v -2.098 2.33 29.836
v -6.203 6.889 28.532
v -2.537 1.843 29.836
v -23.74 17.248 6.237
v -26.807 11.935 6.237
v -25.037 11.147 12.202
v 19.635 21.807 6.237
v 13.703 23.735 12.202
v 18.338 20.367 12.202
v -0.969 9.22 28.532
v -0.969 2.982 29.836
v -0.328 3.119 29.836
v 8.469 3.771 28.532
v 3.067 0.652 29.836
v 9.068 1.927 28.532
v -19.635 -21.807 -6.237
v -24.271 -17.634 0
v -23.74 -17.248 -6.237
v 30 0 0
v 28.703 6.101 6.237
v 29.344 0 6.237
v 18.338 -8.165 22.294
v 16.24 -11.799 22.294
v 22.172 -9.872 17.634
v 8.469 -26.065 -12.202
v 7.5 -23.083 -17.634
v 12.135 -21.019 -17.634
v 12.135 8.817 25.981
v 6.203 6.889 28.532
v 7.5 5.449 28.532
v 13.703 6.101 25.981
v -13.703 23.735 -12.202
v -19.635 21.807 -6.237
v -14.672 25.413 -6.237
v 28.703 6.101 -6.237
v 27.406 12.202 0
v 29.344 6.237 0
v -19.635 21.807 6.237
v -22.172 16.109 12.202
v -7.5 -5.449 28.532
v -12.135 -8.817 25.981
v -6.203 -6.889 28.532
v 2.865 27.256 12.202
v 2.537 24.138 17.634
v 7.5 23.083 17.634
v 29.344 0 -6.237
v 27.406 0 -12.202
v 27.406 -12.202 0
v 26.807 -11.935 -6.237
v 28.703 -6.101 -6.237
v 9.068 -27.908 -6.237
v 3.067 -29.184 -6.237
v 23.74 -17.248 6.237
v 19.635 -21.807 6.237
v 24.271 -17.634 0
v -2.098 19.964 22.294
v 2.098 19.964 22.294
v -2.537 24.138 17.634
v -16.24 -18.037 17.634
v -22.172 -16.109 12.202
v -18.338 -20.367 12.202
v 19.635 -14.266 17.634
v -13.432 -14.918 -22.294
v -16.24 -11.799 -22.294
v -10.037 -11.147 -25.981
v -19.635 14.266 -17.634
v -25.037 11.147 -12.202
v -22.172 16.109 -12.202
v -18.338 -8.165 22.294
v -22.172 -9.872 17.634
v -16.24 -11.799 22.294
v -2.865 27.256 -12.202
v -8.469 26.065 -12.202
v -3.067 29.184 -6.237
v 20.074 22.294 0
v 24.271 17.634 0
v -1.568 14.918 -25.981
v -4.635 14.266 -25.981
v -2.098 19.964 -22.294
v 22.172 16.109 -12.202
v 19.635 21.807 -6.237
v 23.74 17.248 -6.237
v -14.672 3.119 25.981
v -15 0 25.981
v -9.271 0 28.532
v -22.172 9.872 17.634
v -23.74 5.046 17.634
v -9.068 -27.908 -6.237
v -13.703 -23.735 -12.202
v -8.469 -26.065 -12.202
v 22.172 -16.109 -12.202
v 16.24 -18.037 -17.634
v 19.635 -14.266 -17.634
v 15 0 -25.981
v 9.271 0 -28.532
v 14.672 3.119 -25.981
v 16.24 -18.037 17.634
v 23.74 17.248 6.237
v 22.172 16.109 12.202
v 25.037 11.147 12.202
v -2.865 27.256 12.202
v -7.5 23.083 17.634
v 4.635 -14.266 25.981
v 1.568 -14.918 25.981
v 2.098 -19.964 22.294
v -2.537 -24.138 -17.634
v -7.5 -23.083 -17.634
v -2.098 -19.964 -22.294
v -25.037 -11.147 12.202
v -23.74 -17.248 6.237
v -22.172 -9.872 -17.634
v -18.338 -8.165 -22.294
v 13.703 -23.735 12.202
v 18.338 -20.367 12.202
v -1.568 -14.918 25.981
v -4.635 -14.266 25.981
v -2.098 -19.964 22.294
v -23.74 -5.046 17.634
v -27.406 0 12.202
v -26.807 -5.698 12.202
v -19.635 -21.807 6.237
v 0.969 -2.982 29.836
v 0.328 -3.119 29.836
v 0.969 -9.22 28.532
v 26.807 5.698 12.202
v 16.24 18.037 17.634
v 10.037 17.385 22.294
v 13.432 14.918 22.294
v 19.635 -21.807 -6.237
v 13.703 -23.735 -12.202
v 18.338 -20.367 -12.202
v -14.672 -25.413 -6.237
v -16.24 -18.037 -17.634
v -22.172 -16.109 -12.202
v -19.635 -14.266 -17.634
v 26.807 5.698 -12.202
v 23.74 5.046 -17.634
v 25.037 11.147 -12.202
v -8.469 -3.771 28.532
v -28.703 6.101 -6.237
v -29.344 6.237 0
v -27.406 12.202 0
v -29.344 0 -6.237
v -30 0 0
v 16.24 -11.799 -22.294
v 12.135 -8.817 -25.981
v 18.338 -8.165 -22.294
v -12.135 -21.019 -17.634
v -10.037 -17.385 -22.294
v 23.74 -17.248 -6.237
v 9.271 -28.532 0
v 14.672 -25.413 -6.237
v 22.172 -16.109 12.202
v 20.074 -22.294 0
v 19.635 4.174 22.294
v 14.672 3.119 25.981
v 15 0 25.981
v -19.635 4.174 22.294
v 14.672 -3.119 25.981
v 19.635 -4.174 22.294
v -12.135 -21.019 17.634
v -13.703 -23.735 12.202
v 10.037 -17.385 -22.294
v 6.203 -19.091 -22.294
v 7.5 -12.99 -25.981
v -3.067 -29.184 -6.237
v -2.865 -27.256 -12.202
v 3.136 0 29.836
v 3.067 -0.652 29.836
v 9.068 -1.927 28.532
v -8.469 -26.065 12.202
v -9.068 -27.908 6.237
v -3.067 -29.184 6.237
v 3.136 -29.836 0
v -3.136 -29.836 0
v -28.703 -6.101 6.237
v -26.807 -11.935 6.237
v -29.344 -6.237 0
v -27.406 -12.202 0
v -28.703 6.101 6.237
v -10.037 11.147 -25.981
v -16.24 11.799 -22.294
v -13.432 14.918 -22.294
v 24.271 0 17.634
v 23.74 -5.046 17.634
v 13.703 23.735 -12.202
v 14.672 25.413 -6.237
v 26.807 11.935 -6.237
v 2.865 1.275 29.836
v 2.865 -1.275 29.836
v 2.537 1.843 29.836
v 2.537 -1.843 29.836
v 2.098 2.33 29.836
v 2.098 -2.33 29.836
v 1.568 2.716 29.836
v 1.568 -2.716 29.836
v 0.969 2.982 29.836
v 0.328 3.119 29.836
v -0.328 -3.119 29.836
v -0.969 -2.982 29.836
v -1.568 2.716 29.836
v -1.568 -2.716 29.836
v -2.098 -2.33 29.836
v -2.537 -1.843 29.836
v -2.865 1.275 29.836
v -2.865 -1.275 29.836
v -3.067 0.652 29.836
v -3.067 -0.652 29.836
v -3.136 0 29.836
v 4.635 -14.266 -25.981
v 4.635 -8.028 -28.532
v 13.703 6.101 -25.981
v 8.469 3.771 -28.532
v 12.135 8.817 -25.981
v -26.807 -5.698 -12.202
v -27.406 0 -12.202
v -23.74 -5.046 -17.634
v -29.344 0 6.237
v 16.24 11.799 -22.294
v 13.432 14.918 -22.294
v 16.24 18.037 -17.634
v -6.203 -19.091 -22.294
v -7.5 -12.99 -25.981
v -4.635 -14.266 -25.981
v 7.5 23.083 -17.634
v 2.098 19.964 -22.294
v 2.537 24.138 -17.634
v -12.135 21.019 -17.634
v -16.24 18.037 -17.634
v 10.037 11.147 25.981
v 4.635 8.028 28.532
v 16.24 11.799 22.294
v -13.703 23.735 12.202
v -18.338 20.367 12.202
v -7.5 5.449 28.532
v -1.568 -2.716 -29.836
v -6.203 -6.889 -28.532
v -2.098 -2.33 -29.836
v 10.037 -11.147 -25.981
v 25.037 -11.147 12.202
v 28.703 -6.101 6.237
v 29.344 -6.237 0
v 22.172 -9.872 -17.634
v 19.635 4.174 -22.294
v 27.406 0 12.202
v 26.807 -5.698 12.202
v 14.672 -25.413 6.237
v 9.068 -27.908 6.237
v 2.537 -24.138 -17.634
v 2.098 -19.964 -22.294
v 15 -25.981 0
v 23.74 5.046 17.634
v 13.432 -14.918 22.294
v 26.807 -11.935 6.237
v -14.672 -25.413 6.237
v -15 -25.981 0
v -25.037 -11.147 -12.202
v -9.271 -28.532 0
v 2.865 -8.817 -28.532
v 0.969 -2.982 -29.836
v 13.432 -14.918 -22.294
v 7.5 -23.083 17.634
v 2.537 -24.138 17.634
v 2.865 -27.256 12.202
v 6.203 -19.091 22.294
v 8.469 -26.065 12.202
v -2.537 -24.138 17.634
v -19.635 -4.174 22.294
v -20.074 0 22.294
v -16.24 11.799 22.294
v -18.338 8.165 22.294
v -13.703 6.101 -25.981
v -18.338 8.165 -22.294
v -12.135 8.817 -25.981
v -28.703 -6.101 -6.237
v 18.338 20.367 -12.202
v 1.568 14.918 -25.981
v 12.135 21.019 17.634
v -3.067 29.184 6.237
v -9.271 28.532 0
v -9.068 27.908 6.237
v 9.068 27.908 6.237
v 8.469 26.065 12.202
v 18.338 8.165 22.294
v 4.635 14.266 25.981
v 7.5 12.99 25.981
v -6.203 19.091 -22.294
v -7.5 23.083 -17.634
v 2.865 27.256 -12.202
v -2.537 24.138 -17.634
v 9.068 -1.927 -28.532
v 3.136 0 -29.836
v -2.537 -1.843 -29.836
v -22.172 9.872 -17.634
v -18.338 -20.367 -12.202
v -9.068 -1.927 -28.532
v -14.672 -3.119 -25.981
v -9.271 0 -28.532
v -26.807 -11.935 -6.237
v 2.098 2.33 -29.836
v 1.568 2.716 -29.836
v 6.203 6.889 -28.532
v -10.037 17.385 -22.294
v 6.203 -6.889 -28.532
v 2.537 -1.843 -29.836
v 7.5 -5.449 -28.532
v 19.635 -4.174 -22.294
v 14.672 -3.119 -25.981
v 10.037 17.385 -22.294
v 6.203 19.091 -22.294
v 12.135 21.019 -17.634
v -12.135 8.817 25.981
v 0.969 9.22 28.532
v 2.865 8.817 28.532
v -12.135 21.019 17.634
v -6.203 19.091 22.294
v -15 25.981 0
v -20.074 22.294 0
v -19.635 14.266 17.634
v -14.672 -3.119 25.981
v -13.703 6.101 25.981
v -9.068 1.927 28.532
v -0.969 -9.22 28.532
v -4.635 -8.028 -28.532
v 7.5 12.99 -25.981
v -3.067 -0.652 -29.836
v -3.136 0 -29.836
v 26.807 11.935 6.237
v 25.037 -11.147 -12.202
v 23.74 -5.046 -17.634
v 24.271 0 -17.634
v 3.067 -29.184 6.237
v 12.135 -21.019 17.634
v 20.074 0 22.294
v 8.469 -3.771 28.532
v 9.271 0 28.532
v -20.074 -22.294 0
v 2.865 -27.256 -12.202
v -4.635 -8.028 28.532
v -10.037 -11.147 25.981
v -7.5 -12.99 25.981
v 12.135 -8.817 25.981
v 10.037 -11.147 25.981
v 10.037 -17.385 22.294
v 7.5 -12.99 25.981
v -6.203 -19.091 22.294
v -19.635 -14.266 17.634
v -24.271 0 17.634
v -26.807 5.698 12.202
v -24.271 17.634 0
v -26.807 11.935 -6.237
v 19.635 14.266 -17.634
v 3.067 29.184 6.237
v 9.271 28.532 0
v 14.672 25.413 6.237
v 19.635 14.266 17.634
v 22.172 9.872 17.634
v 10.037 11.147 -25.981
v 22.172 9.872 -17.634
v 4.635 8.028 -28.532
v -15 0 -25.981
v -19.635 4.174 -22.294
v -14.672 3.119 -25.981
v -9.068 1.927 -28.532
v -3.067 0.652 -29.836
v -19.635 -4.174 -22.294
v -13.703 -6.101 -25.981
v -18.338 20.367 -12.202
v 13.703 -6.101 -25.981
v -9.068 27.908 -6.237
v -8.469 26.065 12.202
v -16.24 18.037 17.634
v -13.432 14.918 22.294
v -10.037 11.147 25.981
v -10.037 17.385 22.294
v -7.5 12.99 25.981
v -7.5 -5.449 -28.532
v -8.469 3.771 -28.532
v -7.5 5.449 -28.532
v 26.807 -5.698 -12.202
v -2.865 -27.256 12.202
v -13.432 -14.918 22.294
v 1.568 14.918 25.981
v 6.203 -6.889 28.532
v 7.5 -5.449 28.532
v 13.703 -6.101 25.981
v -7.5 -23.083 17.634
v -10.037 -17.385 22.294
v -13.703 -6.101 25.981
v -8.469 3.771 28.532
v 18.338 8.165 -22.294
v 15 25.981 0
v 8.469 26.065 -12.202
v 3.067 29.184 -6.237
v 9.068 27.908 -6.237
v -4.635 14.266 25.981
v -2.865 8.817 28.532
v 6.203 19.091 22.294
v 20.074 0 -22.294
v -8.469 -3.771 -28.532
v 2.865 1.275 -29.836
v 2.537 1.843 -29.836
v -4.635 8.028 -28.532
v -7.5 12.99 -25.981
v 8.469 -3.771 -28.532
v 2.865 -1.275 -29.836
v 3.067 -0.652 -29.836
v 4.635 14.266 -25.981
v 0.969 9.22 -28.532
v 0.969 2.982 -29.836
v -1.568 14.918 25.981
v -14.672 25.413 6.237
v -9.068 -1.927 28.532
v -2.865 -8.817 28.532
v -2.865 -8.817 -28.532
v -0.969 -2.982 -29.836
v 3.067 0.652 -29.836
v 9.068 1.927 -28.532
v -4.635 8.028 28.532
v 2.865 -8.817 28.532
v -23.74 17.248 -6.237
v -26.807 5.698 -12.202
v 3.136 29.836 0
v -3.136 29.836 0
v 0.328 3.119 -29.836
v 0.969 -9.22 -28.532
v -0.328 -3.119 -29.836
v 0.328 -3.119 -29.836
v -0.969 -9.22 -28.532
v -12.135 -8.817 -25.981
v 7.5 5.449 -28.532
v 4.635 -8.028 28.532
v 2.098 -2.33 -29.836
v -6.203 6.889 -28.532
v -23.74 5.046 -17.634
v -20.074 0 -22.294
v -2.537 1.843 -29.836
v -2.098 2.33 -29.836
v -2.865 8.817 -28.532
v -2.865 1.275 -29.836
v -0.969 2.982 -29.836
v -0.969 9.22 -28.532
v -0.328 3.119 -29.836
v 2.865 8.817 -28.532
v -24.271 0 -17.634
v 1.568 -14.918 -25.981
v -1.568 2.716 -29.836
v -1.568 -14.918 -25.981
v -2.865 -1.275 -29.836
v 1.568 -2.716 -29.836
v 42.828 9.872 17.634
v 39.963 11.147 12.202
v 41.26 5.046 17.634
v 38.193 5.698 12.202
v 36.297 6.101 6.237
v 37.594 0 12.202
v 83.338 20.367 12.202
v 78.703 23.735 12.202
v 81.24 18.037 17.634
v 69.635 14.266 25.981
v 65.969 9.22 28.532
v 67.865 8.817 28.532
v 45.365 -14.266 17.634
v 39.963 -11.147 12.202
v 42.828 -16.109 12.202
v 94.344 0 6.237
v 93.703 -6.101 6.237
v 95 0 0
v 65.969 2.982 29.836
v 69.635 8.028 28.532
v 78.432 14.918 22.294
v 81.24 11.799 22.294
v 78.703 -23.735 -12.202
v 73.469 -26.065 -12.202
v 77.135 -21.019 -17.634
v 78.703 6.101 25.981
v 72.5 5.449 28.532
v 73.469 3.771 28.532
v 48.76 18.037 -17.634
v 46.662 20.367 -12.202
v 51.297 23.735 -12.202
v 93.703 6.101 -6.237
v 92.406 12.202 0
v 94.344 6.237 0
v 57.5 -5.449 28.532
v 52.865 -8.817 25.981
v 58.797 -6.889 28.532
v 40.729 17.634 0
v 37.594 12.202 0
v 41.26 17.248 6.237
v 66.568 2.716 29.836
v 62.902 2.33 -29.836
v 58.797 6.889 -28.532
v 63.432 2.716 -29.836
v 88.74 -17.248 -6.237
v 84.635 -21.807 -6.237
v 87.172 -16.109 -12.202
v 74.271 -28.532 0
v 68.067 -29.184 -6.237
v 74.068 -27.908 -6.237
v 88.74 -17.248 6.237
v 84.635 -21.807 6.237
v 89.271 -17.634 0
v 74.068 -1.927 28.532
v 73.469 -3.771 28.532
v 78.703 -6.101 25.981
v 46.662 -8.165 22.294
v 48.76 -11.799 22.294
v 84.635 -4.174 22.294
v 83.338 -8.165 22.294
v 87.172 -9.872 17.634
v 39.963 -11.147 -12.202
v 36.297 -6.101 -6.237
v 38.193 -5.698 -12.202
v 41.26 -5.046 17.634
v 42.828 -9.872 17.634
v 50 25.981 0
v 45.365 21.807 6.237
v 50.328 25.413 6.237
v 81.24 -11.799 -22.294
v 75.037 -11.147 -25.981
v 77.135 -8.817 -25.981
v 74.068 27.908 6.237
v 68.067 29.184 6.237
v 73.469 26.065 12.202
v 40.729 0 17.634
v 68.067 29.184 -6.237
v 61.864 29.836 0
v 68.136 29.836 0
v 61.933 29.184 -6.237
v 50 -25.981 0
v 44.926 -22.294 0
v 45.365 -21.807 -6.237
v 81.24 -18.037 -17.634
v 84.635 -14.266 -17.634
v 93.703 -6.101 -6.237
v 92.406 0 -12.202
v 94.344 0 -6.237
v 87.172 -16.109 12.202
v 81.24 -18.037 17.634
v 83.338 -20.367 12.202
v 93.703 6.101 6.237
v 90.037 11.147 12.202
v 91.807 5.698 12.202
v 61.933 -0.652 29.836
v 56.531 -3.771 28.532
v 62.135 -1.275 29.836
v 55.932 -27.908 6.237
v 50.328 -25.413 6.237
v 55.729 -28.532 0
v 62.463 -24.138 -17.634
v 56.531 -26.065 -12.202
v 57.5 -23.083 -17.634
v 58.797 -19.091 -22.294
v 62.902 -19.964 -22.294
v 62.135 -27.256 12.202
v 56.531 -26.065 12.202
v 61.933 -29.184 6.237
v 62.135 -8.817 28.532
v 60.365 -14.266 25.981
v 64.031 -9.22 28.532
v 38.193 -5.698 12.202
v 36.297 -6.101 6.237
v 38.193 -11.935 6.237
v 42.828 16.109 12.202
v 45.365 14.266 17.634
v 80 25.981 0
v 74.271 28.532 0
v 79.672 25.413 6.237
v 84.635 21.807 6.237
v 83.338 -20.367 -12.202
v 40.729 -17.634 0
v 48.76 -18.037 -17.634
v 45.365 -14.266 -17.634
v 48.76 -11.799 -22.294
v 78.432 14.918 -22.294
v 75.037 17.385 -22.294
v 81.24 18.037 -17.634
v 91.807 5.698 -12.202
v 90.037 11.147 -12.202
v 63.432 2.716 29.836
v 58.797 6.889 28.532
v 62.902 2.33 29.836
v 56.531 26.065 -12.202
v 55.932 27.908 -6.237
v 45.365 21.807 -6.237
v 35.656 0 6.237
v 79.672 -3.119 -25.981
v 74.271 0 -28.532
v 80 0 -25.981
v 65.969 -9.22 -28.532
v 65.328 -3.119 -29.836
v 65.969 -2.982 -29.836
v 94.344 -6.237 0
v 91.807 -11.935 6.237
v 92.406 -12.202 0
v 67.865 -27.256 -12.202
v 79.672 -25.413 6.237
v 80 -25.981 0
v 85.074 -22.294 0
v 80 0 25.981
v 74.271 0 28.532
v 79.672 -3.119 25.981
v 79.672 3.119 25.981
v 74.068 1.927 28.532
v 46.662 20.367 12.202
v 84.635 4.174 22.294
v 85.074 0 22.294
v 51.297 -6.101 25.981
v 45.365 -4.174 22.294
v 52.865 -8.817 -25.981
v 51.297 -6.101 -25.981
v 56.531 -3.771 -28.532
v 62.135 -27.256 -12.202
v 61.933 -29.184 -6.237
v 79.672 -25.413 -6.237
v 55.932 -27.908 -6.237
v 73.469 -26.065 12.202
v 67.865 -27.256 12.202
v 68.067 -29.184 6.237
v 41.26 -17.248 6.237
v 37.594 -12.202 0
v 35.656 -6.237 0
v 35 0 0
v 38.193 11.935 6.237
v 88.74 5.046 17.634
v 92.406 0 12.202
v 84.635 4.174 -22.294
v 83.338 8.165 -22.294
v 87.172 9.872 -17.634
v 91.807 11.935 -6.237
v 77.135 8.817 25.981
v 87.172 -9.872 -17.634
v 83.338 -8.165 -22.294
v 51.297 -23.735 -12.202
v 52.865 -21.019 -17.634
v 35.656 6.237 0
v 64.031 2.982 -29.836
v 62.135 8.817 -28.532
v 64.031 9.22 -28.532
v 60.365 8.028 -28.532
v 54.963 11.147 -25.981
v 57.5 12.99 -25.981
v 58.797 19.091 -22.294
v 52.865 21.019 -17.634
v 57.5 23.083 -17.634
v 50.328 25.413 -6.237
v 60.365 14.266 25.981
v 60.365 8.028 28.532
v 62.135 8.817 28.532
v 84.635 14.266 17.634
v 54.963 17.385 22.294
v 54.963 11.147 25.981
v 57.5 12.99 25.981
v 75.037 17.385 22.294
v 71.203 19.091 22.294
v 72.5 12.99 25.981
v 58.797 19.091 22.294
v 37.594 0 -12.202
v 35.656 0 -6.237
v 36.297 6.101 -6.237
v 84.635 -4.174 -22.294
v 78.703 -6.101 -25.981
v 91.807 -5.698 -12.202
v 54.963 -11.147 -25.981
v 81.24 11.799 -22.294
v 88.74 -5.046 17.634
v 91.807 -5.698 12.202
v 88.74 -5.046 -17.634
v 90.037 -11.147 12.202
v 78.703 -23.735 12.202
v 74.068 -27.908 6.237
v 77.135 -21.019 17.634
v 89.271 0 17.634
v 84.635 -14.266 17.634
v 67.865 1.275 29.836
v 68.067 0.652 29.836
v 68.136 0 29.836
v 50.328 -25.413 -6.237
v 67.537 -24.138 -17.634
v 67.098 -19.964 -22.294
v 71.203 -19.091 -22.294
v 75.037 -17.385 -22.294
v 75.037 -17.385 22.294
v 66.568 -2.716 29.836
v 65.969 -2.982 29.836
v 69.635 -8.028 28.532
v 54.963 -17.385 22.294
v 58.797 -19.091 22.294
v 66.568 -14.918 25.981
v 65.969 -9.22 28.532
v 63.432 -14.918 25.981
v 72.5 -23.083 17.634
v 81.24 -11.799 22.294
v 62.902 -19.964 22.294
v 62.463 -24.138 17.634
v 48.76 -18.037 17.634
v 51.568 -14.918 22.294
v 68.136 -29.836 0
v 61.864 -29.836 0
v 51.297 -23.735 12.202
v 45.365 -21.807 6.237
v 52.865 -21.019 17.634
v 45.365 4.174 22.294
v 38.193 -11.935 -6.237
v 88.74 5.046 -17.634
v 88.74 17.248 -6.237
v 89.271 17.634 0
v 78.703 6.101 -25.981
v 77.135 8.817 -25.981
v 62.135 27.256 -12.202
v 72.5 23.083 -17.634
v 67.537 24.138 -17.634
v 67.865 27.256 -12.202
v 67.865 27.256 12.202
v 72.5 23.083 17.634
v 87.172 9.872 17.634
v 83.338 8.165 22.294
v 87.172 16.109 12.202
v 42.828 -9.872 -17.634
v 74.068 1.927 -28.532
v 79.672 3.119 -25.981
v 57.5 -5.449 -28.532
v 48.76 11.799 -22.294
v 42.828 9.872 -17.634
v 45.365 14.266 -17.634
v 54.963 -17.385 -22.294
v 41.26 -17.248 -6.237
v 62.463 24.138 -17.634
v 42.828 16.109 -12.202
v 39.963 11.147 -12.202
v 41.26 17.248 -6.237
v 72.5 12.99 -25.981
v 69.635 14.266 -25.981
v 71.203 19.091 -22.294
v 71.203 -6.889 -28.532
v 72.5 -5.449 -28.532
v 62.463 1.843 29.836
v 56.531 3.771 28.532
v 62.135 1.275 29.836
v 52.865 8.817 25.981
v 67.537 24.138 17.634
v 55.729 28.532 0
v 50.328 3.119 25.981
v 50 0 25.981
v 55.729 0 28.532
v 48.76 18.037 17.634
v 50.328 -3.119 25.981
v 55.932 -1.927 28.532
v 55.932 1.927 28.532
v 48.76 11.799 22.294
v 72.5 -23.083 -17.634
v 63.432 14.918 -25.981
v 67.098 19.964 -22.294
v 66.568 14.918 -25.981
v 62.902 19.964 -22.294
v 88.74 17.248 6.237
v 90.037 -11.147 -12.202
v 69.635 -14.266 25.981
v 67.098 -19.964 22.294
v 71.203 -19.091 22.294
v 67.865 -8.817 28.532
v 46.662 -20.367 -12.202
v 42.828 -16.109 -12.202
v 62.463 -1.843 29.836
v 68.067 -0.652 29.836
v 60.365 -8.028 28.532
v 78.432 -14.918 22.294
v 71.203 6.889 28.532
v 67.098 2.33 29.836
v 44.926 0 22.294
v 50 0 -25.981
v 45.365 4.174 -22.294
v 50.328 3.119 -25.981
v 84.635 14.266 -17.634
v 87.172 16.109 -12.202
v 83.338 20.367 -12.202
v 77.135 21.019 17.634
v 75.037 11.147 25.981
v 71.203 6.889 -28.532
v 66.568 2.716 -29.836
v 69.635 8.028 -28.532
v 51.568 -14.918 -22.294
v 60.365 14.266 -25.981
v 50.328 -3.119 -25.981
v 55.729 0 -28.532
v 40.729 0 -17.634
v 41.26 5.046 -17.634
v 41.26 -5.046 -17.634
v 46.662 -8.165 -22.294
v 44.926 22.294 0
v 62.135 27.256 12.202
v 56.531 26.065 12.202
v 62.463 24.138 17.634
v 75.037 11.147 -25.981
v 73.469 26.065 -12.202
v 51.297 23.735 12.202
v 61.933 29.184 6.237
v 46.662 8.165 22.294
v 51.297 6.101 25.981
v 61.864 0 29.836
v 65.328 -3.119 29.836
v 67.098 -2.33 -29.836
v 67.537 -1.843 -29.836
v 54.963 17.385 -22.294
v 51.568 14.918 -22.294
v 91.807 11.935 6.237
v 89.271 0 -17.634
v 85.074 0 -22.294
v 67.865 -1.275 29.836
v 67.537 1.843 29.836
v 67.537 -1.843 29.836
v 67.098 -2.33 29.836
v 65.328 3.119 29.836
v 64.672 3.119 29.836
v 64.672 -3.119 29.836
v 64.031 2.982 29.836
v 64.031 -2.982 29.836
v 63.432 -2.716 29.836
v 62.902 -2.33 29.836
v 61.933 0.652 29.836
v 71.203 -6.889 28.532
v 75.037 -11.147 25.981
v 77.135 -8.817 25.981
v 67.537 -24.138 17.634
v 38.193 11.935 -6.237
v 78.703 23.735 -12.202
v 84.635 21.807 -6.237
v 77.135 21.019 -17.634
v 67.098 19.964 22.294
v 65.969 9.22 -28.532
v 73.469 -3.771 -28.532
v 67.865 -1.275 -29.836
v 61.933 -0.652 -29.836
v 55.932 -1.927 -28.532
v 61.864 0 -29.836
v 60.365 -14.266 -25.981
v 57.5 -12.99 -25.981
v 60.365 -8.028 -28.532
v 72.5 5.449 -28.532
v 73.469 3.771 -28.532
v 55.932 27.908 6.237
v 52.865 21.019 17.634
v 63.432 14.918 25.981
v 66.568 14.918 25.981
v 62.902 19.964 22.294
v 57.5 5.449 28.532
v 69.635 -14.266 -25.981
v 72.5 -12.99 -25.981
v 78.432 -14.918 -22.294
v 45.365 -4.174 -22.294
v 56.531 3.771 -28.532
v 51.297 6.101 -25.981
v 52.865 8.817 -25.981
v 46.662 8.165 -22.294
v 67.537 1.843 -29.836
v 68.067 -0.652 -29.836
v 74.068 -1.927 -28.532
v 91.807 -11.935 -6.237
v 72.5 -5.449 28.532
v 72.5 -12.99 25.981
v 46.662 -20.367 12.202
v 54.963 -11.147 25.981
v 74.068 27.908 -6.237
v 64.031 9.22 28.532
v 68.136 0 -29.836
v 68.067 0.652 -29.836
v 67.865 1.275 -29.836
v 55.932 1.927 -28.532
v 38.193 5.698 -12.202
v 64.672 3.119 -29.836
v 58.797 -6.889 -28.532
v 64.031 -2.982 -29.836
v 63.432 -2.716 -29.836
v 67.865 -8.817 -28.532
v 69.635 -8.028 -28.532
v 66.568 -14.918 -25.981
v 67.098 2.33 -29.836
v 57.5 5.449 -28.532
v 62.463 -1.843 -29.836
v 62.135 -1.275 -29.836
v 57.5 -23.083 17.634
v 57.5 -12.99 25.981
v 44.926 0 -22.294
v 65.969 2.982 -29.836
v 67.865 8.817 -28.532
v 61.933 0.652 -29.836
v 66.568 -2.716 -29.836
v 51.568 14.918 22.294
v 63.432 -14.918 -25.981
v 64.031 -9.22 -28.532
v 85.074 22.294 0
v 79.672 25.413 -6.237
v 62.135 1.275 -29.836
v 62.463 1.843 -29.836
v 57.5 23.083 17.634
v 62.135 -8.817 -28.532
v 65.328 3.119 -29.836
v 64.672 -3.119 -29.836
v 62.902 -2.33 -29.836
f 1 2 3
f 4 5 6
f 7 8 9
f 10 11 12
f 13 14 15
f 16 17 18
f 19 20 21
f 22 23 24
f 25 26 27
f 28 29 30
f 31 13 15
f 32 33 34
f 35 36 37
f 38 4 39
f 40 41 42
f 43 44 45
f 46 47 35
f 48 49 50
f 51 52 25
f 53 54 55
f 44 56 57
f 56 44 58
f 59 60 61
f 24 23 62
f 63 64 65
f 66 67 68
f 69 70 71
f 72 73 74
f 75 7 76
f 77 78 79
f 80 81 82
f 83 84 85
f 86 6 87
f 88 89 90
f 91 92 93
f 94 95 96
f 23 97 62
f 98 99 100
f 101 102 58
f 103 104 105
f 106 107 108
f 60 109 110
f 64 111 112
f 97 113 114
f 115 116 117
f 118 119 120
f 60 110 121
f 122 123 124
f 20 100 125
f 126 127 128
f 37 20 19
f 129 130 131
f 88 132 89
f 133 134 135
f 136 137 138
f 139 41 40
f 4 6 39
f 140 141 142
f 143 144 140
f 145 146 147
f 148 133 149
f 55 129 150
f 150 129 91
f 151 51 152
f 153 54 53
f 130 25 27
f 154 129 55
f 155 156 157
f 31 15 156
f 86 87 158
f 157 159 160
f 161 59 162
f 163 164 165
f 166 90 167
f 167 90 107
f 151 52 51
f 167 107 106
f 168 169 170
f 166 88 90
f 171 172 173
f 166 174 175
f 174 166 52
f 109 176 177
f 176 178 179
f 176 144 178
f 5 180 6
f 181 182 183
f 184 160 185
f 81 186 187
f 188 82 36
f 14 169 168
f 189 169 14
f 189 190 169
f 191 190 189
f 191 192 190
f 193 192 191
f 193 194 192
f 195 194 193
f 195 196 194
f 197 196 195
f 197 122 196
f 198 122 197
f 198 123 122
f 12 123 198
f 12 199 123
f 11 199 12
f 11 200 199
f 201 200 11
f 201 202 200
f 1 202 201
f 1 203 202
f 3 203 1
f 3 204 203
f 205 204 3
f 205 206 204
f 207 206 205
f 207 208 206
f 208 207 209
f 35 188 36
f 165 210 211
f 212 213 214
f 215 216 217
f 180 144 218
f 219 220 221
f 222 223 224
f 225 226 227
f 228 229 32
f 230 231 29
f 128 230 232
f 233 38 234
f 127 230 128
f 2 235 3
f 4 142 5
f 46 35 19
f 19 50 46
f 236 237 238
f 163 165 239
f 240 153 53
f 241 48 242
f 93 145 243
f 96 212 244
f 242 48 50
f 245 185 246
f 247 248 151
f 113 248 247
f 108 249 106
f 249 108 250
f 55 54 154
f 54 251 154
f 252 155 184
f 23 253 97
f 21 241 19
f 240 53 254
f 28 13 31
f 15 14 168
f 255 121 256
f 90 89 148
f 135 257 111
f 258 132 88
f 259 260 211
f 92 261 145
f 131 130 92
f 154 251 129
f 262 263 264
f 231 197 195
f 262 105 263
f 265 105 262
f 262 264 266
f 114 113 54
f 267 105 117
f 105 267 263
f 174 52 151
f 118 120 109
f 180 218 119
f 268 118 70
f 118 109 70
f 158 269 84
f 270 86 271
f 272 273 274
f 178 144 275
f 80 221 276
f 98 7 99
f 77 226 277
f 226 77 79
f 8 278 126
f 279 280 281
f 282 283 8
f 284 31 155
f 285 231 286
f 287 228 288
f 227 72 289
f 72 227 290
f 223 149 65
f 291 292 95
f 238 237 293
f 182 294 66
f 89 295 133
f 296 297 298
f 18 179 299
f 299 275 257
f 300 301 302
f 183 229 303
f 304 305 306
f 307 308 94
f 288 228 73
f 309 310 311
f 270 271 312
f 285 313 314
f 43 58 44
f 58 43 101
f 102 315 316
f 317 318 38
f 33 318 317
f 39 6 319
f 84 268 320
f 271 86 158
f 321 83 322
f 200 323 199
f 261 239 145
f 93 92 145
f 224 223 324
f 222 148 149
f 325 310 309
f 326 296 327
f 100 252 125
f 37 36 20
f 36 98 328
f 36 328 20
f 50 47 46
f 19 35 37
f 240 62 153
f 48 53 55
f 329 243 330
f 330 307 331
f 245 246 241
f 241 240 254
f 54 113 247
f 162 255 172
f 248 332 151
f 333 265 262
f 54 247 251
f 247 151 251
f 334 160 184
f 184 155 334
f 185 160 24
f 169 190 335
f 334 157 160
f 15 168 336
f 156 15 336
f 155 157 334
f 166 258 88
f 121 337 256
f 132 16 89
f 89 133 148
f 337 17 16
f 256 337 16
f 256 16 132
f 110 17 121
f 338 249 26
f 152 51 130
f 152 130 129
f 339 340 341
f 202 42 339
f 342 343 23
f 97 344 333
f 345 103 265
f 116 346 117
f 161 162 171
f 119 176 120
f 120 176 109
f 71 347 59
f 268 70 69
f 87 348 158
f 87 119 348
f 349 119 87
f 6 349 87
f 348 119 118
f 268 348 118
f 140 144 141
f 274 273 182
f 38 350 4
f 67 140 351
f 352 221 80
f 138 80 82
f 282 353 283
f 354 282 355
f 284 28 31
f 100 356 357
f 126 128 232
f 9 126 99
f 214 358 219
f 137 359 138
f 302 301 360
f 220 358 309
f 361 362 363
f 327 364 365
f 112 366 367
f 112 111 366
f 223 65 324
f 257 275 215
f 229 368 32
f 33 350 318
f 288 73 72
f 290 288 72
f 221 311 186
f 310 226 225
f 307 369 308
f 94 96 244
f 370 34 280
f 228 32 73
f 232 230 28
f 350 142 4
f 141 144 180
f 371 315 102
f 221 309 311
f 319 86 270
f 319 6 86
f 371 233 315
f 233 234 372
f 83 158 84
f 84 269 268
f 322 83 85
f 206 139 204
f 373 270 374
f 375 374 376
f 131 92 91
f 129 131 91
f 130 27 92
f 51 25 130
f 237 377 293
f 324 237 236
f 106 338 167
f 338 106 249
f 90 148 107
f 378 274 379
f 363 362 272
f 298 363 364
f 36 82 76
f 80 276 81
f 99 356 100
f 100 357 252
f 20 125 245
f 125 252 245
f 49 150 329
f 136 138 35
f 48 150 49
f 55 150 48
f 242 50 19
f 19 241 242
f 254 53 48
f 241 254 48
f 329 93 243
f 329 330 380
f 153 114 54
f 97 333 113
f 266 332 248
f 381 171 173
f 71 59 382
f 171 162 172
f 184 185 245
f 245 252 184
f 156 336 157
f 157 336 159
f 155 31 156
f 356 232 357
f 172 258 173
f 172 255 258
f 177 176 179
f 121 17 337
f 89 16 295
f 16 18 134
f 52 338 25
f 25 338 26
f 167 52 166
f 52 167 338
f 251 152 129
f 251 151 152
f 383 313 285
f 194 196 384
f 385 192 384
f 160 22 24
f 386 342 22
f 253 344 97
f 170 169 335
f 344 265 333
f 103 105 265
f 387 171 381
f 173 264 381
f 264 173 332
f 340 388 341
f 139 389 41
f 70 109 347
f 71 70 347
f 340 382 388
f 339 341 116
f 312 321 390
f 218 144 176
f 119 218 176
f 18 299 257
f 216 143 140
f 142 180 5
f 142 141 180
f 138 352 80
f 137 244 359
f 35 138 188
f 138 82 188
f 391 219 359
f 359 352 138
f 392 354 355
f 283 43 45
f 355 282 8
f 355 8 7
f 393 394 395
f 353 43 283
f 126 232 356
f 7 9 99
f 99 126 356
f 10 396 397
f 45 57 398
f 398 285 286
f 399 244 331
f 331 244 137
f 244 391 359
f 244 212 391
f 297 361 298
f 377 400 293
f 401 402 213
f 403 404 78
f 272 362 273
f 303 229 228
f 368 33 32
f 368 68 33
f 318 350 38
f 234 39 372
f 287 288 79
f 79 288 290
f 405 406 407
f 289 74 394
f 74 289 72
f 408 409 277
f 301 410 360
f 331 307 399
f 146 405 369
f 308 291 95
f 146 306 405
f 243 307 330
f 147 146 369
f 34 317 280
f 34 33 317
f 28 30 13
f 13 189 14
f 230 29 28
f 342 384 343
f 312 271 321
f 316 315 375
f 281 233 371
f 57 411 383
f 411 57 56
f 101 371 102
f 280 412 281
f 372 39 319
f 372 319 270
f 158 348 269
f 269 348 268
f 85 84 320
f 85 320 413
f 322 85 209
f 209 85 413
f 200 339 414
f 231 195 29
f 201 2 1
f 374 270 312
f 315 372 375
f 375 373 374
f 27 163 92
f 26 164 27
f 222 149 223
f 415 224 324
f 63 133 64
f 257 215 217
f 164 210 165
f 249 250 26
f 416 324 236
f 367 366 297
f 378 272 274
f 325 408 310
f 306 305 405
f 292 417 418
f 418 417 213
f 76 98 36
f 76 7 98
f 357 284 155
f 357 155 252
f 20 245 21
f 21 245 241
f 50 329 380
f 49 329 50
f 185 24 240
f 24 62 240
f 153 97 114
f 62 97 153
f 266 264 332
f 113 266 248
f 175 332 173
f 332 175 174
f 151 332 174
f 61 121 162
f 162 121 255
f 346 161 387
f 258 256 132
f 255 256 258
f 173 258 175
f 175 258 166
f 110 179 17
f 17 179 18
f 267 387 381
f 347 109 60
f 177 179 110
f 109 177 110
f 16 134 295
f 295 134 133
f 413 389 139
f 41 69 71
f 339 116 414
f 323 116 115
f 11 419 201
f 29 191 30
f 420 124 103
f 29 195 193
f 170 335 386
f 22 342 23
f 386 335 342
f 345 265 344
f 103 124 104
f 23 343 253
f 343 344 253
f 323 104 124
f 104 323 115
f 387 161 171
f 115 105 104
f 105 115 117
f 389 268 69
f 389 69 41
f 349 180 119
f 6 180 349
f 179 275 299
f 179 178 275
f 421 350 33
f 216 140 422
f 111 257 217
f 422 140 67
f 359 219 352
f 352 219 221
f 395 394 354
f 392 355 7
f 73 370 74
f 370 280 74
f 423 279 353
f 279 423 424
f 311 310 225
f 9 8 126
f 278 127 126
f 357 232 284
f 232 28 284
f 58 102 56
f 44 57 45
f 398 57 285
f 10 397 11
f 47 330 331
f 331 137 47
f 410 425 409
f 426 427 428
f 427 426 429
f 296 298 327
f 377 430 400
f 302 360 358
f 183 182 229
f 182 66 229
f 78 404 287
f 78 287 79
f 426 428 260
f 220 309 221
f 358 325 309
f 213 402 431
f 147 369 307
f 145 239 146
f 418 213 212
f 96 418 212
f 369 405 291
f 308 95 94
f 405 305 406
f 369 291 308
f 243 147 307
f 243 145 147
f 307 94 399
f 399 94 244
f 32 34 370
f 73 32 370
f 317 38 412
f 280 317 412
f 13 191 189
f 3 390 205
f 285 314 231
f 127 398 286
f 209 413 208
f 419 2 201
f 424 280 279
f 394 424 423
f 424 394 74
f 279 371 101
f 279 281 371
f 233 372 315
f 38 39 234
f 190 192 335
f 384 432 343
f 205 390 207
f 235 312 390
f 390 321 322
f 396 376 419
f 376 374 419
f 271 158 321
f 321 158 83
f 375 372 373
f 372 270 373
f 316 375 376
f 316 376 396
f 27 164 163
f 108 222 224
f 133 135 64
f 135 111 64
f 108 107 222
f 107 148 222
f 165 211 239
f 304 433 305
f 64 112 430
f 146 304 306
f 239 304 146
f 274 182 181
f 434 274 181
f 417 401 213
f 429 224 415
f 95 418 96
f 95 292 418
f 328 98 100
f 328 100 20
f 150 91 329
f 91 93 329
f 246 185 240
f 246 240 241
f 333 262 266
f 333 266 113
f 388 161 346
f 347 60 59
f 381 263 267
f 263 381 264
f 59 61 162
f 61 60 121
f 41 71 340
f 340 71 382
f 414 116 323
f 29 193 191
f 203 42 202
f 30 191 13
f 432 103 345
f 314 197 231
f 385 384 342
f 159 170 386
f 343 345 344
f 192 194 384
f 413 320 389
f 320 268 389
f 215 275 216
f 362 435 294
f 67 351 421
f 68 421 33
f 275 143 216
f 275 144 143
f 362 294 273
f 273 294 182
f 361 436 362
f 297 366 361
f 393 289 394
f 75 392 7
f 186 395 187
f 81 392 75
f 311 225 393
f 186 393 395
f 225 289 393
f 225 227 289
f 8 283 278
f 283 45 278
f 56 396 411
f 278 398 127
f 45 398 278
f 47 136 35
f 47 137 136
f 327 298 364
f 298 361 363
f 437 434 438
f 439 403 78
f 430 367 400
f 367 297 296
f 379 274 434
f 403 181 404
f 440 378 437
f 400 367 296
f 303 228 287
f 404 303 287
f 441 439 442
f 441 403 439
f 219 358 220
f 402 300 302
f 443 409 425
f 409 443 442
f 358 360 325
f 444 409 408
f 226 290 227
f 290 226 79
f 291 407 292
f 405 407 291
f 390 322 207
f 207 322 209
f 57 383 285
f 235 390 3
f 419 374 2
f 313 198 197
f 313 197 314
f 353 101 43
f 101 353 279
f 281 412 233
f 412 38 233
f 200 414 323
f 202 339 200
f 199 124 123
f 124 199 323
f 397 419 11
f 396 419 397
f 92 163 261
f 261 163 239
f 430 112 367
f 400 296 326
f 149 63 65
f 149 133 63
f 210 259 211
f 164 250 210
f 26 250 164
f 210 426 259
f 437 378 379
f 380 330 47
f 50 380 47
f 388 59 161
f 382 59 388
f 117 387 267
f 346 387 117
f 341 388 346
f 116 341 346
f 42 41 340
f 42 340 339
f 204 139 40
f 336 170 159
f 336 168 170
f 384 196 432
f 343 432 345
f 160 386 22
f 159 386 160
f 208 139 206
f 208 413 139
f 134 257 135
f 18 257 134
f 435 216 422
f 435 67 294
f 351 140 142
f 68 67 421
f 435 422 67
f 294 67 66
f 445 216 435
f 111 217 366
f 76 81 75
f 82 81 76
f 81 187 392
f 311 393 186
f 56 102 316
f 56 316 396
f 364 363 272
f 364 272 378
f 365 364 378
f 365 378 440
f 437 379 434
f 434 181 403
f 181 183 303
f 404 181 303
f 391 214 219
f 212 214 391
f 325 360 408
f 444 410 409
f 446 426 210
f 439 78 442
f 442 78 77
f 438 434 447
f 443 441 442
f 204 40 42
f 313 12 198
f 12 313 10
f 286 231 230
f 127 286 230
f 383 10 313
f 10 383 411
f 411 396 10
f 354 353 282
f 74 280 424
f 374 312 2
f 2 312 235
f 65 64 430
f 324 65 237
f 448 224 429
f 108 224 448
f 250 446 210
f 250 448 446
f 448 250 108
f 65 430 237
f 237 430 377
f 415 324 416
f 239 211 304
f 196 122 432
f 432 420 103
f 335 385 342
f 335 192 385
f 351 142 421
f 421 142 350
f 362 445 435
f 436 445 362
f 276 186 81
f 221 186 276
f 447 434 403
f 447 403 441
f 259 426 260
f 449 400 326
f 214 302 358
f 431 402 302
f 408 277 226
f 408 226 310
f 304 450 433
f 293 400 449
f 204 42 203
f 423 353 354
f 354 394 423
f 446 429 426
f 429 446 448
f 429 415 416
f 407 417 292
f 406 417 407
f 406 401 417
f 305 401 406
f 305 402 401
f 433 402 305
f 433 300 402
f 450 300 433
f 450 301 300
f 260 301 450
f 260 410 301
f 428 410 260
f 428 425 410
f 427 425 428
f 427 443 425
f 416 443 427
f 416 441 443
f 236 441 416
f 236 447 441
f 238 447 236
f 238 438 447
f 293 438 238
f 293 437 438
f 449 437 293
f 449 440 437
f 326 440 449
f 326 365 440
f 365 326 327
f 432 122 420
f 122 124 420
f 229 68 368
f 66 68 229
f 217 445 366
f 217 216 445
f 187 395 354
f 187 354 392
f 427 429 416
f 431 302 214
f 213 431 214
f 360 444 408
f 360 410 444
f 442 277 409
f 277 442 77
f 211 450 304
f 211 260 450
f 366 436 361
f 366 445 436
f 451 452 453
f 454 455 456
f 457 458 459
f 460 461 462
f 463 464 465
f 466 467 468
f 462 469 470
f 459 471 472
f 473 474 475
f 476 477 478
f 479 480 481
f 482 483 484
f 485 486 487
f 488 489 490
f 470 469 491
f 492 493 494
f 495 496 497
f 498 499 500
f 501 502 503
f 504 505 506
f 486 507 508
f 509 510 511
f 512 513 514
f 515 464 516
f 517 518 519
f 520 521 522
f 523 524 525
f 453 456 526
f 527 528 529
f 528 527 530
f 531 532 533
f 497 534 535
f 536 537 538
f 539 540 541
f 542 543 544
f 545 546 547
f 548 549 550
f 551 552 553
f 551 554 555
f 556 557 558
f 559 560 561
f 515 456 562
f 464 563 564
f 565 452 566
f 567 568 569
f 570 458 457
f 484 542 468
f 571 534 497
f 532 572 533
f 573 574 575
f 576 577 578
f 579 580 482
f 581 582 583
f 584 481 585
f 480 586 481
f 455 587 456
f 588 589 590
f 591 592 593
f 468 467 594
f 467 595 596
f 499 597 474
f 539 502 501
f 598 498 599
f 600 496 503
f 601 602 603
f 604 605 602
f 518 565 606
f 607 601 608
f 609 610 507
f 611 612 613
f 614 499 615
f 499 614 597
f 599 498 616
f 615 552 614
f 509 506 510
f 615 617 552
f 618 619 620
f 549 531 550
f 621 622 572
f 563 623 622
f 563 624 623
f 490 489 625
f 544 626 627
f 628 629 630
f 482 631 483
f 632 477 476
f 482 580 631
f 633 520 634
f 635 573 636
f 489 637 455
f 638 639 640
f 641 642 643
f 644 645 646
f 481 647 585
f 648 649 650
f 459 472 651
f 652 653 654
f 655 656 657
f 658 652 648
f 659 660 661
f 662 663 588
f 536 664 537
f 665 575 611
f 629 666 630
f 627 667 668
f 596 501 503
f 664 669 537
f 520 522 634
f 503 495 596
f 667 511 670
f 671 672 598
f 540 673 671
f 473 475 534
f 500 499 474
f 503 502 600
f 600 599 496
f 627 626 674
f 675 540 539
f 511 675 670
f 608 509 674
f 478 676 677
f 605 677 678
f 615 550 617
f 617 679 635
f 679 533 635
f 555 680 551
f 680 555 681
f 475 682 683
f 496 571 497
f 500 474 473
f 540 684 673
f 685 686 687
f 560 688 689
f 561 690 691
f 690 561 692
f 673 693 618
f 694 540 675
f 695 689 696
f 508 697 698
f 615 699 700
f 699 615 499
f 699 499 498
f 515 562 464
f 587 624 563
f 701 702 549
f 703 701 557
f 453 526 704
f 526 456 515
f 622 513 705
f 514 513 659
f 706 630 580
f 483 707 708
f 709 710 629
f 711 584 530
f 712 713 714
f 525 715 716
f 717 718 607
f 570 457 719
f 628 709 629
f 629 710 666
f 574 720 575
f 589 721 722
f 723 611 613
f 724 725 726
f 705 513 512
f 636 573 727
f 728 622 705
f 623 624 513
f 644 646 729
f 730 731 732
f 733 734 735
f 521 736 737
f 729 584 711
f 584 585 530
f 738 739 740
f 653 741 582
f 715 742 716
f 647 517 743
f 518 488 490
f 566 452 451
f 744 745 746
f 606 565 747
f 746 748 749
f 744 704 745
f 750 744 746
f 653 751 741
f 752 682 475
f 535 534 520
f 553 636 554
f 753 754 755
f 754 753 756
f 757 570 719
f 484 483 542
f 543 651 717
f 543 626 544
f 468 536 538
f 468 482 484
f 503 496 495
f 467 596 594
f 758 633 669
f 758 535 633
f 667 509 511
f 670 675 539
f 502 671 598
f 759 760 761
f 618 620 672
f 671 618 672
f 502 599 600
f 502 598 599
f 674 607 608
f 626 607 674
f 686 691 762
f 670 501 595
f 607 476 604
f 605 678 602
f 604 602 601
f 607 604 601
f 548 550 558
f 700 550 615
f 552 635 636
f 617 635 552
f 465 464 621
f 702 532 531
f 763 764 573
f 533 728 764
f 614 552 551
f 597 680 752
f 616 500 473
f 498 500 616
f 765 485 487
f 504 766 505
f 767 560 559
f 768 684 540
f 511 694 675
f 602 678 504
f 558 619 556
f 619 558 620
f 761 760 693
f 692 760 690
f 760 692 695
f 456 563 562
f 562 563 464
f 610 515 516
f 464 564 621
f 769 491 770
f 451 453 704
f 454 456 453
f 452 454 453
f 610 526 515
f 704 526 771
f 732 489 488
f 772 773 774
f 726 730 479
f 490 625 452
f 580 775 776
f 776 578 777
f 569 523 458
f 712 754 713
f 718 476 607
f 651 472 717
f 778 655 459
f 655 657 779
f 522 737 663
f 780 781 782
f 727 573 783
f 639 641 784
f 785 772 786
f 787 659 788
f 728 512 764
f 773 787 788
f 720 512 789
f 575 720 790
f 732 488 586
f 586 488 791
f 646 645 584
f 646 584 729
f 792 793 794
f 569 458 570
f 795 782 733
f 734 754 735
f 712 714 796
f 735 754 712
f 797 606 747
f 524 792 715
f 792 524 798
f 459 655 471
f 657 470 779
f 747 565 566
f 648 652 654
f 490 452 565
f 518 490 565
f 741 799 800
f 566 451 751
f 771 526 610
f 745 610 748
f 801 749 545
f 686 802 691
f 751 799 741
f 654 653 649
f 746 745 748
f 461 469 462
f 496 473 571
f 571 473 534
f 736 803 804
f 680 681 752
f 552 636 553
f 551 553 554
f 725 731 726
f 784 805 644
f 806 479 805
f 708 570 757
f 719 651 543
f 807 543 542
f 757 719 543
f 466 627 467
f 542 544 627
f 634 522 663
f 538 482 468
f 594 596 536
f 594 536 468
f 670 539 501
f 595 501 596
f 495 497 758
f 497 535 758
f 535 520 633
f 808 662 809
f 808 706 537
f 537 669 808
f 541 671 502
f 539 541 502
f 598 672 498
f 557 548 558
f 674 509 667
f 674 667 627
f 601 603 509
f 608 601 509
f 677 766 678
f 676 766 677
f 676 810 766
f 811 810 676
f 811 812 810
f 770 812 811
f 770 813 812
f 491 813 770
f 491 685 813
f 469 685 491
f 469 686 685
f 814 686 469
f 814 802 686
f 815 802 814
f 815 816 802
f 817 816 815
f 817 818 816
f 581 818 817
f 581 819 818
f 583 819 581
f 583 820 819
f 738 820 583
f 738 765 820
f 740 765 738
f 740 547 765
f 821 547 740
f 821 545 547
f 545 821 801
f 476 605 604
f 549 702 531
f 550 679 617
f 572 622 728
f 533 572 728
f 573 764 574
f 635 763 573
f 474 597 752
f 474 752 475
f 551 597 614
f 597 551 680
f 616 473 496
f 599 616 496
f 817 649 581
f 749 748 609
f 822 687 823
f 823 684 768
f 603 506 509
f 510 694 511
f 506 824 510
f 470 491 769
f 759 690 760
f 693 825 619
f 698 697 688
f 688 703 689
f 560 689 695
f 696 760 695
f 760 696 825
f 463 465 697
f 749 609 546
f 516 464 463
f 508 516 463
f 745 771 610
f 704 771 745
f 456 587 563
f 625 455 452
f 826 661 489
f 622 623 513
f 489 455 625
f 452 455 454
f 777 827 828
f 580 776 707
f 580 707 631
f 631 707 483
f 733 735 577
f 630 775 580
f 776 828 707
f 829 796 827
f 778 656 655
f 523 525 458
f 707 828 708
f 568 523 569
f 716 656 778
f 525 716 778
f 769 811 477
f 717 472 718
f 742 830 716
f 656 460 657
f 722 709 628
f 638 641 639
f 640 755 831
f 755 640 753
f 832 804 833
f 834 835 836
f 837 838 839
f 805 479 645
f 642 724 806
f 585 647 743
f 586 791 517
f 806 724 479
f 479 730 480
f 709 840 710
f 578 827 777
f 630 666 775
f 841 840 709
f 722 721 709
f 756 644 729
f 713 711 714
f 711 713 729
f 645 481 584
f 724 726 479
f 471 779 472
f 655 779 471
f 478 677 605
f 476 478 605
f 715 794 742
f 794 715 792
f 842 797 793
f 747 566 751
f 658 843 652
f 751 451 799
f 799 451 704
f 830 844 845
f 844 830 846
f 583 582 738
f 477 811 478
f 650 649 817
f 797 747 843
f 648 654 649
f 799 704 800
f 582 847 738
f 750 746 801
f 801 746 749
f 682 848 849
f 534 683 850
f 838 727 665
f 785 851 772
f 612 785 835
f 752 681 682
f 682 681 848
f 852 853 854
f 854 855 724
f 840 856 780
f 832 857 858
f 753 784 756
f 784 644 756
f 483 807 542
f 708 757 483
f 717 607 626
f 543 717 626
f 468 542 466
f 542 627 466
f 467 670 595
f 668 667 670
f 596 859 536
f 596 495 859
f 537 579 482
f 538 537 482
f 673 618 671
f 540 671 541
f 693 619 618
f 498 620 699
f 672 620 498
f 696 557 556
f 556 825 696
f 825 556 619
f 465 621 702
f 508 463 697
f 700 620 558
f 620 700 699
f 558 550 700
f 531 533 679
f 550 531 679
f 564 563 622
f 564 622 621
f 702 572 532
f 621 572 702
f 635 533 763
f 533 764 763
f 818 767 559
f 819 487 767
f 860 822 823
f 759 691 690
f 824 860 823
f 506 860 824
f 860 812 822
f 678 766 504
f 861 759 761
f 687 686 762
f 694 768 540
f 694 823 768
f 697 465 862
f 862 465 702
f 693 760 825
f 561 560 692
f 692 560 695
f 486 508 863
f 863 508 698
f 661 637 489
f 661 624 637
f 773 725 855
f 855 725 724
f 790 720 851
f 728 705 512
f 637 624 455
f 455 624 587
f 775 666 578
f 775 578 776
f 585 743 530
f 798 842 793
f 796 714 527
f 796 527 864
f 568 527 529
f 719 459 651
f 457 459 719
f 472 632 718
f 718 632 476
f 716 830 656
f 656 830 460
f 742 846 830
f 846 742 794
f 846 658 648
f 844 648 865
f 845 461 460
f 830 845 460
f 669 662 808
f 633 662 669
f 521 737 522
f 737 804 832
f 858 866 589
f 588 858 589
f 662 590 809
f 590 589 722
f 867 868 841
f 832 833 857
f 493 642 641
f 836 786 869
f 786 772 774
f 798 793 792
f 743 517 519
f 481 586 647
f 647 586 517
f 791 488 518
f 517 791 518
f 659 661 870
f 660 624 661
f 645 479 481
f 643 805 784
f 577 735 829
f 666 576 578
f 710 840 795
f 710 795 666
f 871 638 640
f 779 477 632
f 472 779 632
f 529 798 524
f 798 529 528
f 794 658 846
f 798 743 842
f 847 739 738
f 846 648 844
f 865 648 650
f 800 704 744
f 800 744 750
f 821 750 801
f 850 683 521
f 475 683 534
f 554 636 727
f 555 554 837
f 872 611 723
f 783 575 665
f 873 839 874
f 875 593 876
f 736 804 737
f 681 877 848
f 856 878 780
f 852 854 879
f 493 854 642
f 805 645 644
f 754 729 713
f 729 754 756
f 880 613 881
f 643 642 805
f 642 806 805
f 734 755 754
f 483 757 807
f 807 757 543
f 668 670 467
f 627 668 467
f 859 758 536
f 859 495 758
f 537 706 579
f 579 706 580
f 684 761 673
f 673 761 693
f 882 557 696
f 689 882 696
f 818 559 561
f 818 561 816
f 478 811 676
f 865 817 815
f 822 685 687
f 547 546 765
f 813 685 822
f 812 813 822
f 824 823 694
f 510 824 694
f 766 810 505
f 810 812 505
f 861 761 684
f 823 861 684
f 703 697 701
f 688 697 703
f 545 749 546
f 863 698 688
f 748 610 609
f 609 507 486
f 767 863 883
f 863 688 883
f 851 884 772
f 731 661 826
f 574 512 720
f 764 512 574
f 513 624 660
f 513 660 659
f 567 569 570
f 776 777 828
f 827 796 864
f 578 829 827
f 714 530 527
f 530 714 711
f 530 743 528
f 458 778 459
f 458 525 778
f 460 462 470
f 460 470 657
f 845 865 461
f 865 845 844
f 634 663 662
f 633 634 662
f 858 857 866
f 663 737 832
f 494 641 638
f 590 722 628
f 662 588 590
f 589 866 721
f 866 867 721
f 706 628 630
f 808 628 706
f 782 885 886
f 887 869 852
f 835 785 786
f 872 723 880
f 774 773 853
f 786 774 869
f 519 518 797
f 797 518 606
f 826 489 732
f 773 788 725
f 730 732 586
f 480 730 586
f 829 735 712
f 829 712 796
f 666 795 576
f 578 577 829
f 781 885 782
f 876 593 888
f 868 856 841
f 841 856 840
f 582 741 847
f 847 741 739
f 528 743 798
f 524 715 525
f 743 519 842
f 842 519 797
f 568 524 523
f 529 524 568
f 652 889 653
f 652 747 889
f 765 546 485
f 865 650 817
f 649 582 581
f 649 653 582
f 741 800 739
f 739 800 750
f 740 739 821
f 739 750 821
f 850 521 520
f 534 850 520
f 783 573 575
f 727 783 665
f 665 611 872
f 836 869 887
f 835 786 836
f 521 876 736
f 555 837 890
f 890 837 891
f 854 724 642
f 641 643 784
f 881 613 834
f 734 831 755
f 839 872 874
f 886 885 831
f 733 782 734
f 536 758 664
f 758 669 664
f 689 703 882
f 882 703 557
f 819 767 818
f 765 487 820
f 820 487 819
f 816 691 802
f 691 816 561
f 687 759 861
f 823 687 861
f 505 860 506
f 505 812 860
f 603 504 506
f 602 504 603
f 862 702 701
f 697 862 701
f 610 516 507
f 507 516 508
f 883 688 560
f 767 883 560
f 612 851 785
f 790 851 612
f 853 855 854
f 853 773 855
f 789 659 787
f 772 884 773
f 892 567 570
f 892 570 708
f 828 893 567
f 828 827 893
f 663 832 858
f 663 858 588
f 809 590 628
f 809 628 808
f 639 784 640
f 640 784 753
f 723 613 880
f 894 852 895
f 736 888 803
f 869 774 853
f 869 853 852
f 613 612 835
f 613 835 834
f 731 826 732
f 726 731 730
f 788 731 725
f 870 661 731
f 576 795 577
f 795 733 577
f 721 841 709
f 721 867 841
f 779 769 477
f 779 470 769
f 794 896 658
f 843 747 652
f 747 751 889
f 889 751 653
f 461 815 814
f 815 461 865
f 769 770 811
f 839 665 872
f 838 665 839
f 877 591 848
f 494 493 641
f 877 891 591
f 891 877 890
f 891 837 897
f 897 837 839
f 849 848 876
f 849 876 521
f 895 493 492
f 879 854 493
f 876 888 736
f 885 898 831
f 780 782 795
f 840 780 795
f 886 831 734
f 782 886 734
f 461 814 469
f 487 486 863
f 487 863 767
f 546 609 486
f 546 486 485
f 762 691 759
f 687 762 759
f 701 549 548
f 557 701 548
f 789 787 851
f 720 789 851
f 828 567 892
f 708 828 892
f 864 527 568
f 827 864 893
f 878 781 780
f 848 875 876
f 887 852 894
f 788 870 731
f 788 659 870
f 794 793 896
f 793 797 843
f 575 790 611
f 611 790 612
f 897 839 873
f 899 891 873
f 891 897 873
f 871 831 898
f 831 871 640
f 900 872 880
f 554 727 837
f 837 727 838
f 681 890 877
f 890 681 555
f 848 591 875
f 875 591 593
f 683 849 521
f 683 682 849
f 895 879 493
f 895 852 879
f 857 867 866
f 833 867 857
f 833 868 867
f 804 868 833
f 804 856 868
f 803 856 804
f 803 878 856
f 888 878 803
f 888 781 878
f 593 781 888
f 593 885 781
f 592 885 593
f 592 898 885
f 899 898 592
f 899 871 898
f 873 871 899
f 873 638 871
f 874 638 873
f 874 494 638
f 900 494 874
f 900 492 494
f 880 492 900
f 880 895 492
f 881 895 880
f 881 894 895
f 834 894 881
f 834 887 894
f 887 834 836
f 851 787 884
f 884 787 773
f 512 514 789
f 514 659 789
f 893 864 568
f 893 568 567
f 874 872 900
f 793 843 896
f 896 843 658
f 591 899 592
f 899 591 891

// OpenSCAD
module lineup(num, space) {
  for (i = [0 : num-1])
    translate([ space*i, 0, 0 ]) child(0);
}

lineup(2, 65) sphere(30);
